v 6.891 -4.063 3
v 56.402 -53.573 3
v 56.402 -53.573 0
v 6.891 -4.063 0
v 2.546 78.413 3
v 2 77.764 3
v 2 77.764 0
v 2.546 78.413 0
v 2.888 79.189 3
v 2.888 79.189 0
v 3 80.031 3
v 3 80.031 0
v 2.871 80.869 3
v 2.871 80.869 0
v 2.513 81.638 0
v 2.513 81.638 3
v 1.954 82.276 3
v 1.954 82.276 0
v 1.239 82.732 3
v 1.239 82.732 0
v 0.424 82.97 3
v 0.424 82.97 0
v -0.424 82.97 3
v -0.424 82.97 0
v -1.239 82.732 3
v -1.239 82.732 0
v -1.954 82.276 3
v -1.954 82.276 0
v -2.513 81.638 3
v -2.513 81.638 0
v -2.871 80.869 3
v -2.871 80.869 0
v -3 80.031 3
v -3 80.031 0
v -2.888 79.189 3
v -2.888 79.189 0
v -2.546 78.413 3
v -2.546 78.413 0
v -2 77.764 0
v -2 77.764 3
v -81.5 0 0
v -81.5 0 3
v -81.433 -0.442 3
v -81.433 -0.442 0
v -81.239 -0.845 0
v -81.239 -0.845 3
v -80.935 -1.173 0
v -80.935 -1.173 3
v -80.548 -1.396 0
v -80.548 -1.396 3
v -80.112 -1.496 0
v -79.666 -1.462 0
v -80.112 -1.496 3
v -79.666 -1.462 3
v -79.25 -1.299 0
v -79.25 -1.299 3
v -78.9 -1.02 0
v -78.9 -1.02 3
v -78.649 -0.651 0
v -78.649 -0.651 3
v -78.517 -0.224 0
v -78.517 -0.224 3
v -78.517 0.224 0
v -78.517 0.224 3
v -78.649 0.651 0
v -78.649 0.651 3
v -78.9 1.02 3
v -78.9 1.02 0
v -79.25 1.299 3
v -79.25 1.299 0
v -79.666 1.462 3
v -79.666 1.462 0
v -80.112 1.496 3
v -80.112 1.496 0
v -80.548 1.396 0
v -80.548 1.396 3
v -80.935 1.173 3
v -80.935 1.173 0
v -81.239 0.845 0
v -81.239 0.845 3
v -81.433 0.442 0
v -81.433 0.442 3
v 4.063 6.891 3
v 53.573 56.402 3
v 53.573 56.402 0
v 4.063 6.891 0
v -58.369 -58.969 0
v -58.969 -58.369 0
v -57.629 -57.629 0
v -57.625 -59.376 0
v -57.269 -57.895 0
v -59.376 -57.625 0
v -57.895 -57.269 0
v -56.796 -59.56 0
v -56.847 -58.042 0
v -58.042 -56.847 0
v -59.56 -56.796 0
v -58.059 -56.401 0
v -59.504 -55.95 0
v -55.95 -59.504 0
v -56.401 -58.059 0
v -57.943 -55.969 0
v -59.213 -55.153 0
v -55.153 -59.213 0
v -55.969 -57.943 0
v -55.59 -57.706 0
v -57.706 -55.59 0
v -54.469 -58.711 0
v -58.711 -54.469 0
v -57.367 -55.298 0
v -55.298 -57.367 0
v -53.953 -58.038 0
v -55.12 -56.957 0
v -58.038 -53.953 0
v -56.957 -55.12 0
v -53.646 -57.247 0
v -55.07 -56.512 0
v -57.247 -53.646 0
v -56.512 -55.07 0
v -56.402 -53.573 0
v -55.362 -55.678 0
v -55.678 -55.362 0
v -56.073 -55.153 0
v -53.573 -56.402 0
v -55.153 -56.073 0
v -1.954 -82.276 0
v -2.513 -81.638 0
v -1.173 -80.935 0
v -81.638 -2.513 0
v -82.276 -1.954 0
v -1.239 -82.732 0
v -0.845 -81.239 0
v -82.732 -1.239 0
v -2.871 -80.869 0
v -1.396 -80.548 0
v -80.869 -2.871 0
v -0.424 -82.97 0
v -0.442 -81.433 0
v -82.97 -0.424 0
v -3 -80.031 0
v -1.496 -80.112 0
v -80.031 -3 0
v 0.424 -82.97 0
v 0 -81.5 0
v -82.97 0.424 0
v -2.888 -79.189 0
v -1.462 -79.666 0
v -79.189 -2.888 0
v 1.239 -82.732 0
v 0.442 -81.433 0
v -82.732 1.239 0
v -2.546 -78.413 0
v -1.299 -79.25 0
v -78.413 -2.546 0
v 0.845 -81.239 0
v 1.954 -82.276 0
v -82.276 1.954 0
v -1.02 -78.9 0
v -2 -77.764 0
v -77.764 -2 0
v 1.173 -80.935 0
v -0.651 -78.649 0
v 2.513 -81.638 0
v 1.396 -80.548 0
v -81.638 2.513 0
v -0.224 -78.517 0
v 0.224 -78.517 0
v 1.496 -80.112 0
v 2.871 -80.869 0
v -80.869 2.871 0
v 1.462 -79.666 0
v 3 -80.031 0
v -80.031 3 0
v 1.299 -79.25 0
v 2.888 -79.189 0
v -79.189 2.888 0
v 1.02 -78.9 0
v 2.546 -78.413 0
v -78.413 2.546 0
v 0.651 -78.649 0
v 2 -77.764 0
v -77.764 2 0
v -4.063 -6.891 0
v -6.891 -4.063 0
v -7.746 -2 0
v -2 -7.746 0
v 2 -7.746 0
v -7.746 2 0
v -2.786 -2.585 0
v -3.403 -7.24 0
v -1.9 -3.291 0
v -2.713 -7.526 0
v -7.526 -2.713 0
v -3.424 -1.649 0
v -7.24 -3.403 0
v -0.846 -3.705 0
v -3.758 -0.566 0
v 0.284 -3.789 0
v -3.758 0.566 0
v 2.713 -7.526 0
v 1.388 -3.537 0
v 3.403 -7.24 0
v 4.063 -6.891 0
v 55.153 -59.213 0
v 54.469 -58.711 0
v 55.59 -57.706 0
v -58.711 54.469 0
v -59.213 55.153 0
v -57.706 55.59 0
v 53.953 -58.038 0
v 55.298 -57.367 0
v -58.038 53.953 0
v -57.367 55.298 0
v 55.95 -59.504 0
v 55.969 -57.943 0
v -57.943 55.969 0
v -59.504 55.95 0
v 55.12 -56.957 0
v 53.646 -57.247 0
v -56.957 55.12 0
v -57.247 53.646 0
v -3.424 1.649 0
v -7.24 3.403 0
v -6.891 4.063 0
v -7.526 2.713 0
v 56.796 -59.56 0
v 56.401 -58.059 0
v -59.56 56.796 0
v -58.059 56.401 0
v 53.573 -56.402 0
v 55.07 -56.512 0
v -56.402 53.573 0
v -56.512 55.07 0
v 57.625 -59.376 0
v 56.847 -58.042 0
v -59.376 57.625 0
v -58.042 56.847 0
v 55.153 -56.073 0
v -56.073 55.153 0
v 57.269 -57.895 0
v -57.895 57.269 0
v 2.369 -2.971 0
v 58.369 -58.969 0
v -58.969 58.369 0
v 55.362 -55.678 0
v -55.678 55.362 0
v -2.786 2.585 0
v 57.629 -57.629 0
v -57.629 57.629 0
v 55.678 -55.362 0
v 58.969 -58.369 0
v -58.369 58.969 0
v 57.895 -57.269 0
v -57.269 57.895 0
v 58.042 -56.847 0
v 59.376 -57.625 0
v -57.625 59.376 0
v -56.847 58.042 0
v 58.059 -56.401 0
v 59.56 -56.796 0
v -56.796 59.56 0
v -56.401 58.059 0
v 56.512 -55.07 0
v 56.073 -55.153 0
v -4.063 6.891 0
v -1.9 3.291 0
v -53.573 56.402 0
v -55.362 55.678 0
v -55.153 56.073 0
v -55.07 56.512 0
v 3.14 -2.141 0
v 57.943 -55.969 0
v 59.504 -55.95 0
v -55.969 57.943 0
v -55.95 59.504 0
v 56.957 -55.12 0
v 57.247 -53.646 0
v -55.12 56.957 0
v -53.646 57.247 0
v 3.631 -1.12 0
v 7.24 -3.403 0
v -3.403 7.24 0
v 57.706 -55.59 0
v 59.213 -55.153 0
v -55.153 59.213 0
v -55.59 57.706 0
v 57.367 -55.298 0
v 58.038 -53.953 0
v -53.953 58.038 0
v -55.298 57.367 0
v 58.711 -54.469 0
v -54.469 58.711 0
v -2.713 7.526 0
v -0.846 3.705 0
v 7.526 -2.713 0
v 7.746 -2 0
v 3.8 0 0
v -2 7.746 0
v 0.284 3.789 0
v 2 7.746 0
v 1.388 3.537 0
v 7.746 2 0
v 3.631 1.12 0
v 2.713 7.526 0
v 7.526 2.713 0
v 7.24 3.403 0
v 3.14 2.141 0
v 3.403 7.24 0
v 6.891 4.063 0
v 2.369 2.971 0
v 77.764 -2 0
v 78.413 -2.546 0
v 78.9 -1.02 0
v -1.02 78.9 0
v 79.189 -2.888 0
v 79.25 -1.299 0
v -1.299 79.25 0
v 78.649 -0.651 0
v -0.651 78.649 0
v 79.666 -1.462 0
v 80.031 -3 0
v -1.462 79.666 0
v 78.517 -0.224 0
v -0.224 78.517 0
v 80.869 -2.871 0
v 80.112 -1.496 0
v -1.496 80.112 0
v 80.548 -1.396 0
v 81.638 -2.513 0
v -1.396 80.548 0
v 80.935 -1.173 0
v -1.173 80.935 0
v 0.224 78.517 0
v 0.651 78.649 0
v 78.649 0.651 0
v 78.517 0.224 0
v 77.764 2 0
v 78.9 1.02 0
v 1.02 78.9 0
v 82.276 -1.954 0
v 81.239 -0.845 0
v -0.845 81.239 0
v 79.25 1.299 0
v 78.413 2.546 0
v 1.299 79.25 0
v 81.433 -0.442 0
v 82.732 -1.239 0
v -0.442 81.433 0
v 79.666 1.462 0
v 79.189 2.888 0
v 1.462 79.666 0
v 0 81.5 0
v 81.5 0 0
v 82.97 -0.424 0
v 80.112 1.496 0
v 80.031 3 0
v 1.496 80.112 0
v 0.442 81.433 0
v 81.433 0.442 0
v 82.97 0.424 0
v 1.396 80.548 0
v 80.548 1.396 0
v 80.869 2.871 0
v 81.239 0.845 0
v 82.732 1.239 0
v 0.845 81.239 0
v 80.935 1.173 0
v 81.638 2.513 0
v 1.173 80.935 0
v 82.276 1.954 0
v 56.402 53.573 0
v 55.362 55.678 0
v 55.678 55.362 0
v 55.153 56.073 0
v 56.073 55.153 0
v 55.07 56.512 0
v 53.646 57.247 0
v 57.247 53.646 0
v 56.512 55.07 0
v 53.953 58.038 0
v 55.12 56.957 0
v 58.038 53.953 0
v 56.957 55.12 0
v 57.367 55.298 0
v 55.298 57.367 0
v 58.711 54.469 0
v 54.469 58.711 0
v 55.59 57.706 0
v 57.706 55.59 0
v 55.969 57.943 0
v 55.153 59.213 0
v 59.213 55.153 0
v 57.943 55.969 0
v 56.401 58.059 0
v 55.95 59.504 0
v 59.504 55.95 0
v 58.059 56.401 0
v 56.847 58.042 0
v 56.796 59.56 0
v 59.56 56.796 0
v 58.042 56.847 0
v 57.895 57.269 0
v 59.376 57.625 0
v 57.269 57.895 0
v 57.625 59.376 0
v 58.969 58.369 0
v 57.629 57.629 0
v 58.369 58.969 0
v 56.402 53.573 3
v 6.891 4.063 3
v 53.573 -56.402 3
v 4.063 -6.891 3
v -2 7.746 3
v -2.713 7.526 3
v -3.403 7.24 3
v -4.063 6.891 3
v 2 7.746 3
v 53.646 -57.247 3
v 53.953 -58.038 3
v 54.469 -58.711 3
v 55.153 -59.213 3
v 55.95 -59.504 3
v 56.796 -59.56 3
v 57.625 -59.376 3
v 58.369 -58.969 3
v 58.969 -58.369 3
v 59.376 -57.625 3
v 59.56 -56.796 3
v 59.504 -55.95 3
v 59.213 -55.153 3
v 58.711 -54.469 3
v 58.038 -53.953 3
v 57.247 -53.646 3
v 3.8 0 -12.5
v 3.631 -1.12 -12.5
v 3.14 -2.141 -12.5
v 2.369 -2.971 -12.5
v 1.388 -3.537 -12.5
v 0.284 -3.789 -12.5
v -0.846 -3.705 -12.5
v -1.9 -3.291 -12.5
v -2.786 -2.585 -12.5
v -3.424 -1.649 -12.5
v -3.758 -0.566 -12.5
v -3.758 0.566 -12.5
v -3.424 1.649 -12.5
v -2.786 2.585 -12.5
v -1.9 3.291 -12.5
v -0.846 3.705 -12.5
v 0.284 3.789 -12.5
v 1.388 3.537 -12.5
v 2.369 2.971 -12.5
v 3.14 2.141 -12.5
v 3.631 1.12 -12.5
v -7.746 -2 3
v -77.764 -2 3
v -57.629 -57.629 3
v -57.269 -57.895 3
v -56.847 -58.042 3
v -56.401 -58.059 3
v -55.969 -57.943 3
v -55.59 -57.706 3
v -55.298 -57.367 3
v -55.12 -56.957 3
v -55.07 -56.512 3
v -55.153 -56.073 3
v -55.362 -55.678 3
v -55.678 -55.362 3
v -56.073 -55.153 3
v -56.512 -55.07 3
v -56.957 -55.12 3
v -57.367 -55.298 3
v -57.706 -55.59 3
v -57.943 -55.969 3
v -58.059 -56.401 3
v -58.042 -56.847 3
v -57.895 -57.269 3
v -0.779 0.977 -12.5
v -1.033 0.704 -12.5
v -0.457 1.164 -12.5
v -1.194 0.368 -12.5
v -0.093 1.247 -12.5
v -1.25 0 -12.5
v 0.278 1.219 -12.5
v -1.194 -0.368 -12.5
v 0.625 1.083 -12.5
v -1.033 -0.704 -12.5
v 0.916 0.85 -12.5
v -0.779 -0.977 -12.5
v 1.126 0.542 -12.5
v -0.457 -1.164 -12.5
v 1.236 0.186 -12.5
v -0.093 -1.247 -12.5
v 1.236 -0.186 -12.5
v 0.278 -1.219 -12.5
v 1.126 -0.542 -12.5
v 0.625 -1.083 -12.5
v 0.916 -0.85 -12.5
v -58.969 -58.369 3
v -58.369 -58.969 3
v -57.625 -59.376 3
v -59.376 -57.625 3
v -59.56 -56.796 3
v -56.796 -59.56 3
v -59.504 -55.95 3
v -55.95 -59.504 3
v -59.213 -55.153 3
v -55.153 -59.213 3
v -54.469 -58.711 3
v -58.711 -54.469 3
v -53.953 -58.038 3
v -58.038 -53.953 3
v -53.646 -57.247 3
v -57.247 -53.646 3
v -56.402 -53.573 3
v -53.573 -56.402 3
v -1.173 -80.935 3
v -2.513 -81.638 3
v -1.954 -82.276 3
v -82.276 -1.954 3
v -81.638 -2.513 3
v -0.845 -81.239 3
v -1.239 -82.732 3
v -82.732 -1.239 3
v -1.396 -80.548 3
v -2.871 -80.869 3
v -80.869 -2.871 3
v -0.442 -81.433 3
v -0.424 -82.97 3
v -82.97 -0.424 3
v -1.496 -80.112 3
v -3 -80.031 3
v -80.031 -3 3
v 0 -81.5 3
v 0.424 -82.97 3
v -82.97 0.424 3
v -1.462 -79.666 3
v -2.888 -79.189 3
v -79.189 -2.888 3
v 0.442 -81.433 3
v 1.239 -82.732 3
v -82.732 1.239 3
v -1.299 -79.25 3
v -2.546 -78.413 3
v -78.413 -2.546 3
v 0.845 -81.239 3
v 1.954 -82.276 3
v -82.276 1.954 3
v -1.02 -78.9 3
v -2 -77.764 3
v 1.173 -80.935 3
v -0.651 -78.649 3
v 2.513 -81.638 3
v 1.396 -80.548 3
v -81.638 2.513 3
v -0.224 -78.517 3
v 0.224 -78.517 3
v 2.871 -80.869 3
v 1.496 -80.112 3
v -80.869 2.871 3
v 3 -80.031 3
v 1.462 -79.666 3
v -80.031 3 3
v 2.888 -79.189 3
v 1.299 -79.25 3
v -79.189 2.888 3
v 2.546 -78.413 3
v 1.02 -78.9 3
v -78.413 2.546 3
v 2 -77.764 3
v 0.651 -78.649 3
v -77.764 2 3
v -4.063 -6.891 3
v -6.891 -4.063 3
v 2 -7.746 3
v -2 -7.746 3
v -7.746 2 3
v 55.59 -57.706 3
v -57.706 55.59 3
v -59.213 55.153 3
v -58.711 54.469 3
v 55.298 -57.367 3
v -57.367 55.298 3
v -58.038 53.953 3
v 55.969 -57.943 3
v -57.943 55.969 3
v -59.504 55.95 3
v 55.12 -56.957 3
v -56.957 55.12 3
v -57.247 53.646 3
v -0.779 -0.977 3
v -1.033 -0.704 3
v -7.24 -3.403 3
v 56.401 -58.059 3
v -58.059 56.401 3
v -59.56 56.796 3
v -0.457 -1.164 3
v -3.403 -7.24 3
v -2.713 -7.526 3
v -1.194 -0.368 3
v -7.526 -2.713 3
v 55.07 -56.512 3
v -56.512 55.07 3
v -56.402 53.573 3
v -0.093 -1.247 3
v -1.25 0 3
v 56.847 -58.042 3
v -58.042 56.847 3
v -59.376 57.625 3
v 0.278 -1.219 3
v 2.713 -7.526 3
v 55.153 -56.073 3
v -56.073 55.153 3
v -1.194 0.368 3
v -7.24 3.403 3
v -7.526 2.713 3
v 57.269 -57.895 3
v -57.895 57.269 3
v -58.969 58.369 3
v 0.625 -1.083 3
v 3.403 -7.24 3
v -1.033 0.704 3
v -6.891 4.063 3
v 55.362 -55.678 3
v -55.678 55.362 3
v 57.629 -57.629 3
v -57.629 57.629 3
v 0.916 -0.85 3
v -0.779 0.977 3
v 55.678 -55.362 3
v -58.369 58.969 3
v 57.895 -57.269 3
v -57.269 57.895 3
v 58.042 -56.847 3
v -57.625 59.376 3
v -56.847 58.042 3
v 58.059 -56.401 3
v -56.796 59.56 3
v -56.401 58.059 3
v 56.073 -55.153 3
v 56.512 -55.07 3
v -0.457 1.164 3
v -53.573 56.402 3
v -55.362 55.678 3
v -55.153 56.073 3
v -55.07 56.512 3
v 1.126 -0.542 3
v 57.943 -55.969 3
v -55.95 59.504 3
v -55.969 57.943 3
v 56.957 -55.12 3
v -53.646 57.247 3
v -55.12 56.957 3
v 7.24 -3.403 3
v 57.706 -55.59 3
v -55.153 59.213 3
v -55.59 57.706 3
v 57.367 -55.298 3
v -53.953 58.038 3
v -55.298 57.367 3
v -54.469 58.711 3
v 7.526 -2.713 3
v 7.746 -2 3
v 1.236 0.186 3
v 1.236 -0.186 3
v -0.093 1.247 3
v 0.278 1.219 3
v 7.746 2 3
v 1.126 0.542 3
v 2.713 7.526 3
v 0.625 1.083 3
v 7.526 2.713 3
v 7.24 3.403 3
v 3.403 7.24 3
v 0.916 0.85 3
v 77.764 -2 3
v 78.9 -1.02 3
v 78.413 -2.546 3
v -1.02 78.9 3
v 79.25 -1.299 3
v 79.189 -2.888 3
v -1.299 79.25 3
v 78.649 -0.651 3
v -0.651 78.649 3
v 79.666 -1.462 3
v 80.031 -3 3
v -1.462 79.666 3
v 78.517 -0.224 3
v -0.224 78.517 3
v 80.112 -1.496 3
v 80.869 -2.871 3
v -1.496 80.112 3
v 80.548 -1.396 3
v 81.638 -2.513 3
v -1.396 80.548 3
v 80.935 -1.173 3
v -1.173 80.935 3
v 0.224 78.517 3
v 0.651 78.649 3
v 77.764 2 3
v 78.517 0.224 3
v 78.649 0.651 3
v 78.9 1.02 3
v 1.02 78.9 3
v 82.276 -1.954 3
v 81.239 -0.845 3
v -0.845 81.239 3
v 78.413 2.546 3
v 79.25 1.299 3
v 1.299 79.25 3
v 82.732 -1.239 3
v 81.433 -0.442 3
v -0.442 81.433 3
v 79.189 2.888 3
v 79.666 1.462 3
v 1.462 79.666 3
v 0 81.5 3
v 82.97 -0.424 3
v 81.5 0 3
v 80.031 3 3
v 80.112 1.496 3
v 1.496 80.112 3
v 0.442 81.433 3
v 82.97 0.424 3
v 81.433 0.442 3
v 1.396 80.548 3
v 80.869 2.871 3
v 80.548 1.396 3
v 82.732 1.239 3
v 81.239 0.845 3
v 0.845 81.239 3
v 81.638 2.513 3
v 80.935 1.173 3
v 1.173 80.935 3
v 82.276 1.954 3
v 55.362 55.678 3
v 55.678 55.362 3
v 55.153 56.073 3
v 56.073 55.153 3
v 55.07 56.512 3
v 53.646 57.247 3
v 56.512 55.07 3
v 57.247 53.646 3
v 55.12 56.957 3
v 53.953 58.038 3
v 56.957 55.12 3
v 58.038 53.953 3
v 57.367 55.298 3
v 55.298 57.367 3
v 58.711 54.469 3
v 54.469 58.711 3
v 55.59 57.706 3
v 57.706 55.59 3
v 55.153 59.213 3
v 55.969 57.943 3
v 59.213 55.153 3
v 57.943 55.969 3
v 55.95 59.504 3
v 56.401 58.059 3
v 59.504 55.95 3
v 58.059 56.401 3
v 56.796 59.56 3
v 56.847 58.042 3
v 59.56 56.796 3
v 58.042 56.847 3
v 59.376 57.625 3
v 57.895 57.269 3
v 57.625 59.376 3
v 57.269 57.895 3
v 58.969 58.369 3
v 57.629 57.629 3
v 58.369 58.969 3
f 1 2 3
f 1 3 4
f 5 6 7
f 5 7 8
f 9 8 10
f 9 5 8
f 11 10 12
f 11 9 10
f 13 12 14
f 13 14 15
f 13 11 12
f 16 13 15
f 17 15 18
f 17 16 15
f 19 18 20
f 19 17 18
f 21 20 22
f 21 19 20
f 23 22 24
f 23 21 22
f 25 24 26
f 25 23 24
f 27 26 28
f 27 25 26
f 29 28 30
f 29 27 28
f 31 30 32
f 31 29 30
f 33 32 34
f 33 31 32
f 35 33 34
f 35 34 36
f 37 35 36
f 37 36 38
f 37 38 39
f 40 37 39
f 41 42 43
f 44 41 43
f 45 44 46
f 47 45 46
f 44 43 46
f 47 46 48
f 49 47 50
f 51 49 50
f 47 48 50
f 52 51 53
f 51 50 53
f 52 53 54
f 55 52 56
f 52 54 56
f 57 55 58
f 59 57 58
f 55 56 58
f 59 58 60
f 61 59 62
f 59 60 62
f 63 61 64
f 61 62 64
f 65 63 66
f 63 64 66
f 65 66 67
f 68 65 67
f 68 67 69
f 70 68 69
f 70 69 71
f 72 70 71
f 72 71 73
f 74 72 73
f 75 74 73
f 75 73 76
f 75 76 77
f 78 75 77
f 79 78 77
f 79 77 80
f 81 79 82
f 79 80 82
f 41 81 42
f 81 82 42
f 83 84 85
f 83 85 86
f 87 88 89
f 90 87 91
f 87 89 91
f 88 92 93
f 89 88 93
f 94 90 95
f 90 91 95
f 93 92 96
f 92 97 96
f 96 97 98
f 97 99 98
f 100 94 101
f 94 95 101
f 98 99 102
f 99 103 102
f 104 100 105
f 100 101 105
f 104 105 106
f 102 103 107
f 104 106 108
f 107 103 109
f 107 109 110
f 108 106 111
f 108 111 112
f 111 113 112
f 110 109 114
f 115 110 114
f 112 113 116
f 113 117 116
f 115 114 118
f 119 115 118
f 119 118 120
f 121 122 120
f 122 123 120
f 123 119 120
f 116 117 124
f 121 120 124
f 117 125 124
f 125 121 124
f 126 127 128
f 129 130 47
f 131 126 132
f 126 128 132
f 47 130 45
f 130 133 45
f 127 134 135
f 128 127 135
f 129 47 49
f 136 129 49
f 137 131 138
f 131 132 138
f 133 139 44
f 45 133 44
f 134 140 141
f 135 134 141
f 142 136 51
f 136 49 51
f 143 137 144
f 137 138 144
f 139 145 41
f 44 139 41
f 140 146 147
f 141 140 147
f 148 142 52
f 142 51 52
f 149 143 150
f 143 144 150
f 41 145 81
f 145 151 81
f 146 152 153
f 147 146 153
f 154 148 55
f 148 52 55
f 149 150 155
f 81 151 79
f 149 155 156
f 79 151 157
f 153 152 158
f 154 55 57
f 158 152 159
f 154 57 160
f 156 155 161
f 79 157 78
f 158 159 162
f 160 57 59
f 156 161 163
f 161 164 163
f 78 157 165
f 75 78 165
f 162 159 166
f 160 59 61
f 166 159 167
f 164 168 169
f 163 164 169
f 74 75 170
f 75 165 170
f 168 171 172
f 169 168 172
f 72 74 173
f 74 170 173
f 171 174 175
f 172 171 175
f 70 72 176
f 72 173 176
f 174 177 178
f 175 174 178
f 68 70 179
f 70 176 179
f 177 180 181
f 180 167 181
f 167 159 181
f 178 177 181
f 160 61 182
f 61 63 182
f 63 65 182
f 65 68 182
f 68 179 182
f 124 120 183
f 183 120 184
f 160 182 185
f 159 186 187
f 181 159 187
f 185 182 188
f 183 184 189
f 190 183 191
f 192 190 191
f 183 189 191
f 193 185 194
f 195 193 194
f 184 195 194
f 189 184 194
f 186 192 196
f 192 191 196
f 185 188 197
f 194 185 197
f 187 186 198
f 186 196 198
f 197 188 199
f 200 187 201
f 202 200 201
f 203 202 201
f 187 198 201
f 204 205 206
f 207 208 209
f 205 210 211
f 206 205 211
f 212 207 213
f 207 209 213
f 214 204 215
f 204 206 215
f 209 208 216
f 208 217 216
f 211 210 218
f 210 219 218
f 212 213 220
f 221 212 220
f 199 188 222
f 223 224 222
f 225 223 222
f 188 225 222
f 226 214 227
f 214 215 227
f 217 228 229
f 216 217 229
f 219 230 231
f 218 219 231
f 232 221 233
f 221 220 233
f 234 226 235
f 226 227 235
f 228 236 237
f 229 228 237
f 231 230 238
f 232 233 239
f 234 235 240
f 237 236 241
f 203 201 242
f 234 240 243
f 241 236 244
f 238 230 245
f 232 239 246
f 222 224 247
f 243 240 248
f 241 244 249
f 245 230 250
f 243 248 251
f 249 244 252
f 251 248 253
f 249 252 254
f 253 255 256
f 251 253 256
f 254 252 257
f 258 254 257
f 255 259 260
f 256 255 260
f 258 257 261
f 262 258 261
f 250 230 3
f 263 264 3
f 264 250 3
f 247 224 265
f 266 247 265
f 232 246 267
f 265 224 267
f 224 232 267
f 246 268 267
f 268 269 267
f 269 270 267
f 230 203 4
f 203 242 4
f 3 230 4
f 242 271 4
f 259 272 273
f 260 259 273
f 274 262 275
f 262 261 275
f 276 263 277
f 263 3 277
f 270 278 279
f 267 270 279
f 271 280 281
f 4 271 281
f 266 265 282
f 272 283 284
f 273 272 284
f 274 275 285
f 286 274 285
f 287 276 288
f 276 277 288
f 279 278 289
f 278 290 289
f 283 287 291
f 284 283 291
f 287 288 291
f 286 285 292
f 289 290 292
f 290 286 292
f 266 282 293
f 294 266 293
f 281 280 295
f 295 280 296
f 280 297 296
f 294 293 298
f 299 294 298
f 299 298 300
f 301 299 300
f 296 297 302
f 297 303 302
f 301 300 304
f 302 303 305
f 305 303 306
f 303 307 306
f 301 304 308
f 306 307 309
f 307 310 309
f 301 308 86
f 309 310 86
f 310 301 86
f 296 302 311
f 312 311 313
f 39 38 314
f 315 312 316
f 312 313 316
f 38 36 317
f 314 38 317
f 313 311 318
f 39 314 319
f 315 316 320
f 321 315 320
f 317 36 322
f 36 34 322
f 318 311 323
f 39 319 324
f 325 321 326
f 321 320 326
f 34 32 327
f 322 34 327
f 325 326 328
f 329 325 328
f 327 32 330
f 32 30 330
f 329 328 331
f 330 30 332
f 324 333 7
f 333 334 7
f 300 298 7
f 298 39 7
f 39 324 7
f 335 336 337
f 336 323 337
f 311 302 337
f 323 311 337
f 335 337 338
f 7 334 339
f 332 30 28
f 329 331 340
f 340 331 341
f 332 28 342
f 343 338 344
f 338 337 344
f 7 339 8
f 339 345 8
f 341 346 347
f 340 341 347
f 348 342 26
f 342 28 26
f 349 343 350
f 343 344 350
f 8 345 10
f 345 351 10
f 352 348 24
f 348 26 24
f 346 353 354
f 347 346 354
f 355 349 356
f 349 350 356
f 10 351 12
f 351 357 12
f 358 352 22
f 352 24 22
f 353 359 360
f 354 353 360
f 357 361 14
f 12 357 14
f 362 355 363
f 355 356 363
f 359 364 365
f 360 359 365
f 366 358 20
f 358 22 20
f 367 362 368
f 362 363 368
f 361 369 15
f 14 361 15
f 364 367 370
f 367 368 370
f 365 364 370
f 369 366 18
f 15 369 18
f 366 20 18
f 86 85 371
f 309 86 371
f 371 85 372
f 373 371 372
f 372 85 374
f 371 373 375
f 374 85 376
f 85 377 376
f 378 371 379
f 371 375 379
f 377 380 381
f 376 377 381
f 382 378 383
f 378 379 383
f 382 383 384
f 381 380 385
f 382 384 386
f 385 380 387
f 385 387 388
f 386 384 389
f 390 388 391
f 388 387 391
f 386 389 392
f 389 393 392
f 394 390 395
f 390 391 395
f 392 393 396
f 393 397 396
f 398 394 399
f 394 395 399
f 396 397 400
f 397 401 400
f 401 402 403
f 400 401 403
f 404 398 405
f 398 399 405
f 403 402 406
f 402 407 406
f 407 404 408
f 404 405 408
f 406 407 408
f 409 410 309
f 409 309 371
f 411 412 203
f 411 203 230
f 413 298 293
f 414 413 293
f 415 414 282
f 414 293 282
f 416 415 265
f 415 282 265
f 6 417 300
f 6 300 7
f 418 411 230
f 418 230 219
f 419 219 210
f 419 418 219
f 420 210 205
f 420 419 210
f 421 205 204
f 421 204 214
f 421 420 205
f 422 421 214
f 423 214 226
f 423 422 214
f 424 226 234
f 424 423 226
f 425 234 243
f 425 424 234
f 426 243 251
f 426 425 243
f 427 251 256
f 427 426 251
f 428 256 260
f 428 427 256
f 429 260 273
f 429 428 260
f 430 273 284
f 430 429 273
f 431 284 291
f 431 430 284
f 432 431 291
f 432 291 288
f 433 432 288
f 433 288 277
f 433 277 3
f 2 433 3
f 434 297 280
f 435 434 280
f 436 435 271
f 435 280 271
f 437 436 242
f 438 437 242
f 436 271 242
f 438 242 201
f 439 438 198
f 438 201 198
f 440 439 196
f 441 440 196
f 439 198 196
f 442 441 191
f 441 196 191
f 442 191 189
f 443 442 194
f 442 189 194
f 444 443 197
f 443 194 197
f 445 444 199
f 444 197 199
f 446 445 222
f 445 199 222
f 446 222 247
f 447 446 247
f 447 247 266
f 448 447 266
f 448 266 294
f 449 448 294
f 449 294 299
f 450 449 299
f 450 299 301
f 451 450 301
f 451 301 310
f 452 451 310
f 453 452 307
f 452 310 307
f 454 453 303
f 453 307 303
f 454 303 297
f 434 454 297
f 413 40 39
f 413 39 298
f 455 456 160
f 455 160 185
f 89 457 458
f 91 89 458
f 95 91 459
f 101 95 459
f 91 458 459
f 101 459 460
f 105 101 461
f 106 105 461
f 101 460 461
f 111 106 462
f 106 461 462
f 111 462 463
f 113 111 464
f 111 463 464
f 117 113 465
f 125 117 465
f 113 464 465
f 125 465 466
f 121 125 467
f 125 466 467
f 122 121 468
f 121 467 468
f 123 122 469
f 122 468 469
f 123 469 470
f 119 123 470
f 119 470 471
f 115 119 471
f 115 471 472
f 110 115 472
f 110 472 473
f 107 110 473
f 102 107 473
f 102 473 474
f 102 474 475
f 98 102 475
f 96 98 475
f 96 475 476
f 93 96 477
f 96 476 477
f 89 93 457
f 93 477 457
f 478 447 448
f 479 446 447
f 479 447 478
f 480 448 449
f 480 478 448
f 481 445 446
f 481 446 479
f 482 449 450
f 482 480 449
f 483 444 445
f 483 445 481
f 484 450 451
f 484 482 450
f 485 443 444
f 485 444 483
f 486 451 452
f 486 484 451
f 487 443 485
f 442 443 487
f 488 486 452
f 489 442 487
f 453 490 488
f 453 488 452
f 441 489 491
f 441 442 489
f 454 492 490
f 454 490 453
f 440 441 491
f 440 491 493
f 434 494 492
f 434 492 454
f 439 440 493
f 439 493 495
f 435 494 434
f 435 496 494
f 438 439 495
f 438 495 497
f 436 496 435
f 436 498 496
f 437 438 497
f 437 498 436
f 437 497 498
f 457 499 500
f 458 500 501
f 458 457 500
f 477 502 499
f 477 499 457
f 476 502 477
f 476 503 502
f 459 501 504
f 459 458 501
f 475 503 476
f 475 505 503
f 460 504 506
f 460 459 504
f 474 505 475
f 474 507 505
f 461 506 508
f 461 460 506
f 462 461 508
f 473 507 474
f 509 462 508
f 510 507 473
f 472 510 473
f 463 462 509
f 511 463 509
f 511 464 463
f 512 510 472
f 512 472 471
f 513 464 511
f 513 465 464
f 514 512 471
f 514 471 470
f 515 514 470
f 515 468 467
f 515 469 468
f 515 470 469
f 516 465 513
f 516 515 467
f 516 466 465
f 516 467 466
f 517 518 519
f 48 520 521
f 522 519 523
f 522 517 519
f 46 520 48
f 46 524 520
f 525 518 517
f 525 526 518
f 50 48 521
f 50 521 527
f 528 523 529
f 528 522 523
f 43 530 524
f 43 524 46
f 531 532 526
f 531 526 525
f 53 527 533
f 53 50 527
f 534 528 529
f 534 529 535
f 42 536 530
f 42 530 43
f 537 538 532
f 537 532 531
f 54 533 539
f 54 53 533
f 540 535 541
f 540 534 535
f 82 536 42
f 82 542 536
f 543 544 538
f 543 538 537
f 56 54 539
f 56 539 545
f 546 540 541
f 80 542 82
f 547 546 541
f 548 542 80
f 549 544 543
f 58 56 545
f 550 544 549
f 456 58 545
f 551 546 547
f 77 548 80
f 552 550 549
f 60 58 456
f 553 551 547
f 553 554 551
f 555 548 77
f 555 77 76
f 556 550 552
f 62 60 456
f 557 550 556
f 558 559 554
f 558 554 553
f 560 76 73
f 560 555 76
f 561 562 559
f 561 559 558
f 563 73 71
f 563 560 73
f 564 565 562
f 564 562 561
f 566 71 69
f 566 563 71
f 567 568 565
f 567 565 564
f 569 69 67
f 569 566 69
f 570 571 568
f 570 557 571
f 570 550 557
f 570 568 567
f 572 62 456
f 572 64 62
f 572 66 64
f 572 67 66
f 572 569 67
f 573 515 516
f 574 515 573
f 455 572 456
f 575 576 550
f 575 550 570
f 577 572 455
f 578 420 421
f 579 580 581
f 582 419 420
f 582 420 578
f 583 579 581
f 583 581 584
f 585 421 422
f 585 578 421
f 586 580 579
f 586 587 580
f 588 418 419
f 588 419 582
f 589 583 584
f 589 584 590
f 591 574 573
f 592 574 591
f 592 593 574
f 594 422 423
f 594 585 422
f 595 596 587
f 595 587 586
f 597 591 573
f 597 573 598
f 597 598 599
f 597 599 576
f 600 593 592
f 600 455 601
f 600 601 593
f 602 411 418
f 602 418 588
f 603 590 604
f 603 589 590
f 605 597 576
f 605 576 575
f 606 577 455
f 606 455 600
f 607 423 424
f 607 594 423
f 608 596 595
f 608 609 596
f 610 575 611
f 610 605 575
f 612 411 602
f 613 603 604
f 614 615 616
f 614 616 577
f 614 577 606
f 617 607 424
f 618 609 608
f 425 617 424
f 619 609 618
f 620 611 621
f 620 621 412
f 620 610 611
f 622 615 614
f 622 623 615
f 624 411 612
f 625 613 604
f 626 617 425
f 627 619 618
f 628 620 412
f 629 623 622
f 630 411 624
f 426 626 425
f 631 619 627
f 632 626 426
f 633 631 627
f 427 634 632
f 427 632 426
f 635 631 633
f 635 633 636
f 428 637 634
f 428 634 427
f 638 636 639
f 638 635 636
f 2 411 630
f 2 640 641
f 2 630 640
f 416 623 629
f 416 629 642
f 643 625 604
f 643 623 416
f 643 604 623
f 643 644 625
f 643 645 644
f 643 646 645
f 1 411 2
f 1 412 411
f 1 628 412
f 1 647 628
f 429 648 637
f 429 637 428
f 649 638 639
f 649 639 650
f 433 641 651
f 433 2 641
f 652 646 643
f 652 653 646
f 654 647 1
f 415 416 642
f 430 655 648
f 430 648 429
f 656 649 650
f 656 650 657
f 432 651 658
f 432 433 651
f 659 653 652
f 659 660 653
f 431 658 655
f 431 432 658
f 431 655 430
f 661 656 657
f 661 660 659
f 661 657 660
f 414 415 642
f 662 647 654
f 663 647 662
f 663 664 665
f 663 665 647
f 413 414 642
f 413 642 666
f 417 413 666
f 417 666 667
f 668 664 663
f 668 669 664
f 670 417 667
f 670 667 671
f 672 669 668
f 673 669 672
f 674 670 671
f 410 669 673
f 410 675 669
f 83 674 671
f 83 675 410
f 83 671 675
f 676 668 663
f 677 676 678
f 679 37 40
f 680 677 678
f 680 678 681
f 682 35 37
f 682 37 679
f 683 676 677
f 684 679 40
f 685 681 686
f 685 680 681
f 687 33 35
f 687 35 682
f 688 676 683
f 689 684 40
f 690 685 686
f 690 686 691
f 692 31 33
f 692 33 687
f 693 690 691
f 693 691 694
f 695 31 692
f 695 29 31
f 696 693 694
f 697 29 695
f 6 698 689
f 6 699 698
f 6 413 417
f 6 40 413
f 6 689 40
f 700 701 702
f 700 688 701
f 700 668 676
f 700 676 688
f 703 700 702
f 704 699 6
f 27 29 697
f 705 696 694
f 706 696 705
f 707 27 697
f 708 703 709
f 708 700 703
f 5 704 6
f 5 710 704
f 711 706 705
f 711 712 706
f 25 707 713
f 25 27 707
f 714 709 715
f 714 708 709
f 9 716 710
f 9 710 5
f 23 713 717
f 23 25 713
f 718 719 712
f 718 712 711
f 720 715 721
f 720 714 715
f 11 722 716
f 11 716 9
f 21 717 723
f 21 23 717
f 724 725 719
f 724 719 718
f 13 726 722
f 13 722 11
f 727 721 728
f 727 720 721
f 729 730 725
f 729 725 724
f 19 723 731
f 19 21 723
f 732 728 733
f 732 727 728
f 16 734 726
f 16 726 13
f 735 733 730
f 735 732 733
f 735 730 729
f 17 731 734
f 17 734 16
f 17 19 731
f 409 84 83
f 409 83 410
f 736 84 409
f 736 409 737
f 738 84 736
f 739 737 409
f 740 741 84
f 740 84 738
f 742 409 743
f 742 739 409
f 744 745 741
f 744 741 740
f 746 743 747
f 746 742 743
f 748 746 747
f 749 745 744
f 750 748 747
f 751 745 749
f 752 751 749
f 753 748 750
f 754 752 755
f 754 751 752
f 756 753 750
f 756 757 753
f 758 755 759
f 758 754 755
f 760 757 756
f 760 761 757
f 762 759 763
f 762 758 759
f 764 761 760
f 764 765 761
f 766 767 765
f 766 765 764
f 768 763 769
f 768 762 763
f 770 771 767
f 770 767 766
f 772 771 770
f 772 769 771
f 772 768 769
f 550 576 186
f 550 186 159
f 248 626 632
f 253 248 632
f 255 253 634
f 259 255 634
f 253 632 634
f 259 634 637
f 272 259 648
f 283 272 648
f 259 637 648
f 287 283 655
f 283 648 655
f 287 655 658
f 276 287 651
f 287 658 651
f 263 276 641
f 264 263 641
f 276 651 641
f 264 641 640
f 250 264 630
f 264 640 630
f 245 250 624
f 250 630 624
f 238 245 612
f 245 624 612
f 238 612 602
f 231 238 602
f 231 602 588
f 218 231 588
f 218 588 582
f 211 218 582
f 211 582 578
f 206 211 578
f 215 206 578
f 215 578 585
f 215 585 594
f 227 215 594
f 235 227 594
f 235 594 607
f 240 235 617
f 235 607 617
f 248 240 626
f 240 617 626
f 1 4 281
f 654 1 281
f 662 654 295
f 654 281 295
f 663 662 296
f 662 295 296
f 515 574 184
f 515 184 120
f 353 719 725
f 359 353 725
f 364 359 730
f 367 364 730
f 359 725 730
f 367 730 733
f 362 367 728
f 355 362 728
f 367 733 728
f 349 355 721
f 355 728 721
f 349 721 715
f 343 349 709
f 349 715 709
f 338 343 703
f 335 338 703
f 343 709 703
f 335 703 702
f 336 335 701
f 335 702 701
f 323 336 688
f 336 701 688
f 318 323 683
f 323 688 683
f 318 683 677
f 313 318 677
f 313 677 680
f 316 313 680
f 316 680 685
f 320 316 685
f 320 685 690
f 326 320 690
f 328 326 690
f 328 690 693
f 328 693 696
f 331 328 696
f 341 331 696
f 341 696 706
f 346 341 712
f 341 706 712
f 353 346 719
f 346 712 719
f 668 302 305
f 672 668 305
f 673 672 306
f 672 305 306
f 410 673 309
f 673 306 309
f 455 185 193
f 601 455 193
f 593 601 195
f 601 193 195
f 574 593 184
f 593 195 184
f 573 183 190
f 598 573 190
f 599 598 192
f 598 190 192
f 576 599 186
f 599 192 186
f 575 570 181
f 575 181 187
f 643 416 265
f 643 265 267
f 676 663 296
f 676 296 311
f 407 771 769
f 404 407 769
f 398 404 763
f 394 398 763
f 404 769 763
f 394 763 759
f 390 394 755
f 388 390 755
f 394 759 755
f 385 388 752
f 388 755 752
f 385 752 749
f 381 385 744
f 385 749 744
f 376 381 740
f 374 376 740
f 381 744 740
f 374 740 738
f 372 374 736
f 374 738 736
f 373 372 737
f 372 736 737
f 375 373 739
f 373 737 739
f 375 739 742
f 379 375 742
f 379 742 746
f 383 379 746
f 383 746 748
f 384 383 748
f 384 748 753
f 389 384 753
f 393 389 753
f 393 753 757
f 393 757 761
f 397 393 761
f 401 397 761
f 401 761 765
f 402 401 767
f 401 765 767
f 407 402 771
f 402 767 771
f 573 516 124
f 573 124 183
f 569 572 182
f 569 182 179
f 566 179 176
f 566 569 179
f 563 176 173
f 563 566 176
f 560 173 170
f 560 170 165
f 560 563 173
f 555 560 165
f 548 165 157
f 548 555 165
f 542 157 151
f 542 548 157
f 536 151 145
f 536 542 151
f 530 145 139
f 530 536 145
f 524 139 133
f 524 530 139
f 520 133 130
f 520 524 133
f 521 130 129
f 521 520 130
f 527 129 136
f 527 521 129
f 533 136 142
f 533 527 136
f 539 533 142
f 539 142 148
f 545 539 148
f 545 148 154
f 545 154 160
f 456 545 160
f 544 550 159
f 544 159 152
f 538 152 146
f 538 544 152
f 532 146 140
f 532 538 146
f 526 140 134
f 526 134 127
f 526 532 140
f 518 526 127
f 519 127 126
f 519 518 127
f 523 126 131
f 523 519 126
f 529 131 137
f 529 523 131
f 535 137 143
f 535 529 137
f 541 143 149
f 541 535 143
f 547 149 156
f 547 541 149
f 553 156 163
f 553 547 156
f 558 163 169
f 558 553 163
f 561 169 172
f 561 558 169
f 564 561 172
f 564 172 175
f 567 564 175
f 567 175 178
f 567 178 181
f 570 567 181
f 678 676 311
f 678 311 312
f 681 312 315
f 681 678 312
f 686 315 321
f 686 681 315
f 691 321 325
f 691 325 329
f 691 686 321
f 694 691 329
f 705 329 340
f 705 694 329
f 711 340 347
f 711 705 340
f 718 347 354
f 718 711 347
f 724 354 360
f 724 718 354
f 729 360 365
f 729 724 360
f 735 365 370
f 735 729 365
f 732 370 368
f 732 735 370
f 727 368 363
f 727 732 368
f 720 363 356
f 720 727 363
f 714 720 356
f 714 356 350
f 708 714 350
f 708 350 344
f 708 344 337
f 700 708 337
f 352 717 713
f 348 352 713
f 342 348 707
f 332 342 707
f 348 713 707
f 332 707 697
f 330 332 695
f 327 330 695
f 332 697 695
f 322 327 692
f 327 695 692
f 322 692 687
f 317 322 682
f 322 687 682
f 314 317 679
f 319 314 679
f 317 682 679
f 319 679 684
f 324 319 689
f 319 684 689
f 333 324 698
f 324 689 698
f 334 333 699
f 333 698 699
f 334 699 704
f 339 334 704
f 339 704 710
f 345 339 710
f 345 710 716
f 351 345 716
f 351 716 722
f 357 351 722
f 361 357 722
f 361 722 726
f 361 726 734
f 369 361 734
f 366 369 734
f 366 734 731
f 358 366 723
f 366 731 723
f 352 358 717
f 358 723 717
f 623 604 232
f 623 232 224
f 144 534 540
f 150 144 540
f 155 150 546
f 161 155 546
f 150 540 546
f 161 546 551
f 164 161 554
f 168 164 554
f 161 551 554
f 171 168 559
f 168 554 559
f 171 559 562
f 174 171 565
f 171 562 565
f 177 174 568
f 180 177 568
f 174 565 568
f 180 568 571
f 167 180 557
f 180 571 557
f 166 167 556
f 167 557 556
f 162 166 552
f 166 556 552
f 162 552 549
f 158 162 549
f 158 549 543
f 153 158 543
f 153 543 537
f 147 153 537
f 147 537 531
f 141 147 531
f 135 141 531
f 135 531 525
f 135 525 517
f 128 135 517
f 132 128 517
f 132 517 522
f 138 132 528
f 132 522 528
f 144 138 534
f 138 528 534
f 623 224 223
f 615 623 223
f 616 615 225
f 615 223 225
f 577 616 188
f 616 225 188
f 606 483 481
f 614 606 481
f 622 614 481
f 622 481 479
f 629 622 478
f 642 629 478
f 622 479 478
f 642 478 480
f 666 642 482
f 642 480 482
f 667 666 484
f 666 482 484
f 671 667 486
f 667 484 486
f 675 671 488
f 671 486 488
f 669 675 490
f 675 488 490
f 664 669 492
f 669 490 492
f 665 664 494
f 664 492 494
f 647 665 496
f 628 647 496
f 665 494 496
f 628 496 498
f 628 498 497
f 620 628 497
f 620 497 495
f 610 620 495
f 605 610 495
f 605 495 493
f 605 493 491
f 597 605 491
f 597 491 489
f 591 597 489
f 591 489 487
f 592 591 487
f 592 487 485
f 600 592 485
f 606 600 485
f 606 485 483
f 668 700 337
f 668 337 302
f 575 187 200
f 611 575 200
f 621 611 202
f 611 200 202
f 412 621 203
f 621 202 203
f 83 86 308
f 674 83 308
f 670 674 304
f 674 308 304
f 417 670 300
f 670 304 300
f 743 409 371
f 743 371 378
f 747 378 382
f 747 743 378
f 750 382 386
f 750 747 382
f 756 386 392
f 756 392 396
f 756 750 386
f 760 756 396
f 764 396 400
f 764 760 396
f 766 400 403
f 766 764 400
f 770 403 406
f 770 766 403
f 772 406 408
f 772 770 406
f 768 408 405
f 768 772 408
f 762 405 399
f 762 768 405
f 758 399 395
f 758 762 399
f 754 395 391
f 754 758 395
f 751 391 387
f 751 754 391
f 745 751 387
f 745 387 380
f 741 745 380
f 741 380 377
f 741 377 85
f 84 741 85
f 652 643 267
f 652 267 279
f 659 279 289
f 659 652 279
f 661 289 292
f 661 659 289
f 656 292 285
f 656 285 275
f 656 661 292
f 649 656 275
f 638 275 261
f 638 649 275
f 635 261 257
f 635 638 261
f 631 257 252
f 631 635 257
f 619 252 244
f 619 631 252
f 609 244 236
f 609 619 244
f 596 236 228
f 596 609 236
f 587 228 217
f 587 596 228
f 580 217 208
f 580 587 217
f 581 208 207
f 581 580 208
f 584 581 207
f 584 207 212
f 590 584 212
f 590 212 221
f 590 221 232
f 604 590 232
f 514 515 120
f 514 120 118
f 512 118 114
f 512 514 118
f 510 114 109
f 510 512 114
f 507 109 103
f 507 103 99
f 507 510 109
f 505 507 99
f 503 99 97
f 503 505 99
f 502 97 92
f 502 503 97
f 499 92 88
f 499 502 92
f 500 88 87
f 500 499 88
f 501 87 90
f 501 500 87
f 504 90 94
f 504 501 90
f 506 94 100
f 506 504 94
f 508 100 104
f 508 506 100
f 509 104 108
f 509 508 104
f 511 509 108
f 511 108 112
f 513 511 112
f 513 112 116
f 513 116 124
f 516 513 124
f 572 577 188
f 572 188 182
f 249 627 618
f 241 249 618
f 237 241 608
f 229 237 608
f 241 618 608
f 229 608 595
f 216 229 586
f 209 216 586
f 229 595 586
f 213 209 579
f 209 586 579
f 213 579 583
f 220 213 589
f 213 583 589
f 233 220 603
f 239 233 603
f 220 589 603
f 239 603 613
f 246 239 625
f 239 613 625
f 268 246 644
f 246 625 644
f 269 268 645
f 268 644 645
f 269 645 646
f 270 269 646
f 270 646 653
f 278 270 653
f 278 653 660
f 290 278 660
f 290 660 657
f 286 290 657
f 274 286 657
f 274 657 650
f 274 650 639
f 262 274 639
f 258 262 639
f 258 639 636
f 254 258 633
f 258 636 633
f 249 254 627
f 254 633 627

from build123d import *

# Parameters (mm, degrees)
SKETCH_1_R               = 8
EXTRUDE_1_DEPTH          = 3
SKETCH_2_R               = 1.5
EXTRUDE_760_DEPTH        = 3
PATTERN_CIRCULAR_3_COUNT = 8
SKETCH_3_R               = 3.8
EXTRUDE_3_DEPTH          = 12.5
SKETCH_4_R               = 1.25
CUT_EXTRUDE_1_DEPTH      = 119.398690871


with BuildPart() as part:
    # 草图1 → 凸台-拉伸1 (new body)
    with BuildSketch(Plane.XY):
        Circle(SKETCH_1_R)
    extrude(amount=EXTRUDE_1_DEPTH)

    # 草图2 → Extrude 760 (add)
    with BuildSketch(Plane.XY.offset(3)):
        with BuildLine():
            ThreePointArc((7.745966692, 2), (8, 0), (7.745966692, -2))
            Line((7.745966692, -2), (77.763932023, -2))
            ThreePointArc((77.763932023, -2), (83, 0), (77.763932023, 2))
            Line((77.763932023, 2), (7.745966692, 2))
        make_face()
        with Locations((80, 0)):
            Circle(SKETCH_2_R, mode=Mode.SUBTRACT)
    extrude_760 = extrude(amount=-EXTRUDE_760_DEPTH)

    # 阵列(圆周)3: Extrude 760 ×8 about axis
    pattern_circular_3_axis = Axis((0, 0, 0), (0, 0, 1))
    for i in range(1, PATTERN_CIRCULAR_3_COUNT):
        add(extrude_760.rotate(pattern_circular_3_axis, i * 360 / PATTERN_CIRCULAR_3_COUNT))

    # 草图3 → 凸台-拉伸3 (add)
    with BuildSketch(Plane(origin=(0, 0, 0), x_dir=(-1, 0, 0), z_dir=(0, 0, -1))):
        with Locations(Location((0, 0, 0), (0, 0, 180))):
            Circle(SKETCH_3_R)
    extrude(amount=EXTRUDE_3_DEPTH)

    # 草图4 → 切除-拉伸1 (cut, through all)
    with BuildSketch(Plane(origin=(0, 0, -12.5), x_dir=(-1, 0, 0), z_dir=(0, 0, -1))):
        Circle(SKETCH_4_R)
    extrude(amount=-CUT_EXTRUDE_1_DEPTH, mode=Mode.SUBTRACT)


solid = part.part
